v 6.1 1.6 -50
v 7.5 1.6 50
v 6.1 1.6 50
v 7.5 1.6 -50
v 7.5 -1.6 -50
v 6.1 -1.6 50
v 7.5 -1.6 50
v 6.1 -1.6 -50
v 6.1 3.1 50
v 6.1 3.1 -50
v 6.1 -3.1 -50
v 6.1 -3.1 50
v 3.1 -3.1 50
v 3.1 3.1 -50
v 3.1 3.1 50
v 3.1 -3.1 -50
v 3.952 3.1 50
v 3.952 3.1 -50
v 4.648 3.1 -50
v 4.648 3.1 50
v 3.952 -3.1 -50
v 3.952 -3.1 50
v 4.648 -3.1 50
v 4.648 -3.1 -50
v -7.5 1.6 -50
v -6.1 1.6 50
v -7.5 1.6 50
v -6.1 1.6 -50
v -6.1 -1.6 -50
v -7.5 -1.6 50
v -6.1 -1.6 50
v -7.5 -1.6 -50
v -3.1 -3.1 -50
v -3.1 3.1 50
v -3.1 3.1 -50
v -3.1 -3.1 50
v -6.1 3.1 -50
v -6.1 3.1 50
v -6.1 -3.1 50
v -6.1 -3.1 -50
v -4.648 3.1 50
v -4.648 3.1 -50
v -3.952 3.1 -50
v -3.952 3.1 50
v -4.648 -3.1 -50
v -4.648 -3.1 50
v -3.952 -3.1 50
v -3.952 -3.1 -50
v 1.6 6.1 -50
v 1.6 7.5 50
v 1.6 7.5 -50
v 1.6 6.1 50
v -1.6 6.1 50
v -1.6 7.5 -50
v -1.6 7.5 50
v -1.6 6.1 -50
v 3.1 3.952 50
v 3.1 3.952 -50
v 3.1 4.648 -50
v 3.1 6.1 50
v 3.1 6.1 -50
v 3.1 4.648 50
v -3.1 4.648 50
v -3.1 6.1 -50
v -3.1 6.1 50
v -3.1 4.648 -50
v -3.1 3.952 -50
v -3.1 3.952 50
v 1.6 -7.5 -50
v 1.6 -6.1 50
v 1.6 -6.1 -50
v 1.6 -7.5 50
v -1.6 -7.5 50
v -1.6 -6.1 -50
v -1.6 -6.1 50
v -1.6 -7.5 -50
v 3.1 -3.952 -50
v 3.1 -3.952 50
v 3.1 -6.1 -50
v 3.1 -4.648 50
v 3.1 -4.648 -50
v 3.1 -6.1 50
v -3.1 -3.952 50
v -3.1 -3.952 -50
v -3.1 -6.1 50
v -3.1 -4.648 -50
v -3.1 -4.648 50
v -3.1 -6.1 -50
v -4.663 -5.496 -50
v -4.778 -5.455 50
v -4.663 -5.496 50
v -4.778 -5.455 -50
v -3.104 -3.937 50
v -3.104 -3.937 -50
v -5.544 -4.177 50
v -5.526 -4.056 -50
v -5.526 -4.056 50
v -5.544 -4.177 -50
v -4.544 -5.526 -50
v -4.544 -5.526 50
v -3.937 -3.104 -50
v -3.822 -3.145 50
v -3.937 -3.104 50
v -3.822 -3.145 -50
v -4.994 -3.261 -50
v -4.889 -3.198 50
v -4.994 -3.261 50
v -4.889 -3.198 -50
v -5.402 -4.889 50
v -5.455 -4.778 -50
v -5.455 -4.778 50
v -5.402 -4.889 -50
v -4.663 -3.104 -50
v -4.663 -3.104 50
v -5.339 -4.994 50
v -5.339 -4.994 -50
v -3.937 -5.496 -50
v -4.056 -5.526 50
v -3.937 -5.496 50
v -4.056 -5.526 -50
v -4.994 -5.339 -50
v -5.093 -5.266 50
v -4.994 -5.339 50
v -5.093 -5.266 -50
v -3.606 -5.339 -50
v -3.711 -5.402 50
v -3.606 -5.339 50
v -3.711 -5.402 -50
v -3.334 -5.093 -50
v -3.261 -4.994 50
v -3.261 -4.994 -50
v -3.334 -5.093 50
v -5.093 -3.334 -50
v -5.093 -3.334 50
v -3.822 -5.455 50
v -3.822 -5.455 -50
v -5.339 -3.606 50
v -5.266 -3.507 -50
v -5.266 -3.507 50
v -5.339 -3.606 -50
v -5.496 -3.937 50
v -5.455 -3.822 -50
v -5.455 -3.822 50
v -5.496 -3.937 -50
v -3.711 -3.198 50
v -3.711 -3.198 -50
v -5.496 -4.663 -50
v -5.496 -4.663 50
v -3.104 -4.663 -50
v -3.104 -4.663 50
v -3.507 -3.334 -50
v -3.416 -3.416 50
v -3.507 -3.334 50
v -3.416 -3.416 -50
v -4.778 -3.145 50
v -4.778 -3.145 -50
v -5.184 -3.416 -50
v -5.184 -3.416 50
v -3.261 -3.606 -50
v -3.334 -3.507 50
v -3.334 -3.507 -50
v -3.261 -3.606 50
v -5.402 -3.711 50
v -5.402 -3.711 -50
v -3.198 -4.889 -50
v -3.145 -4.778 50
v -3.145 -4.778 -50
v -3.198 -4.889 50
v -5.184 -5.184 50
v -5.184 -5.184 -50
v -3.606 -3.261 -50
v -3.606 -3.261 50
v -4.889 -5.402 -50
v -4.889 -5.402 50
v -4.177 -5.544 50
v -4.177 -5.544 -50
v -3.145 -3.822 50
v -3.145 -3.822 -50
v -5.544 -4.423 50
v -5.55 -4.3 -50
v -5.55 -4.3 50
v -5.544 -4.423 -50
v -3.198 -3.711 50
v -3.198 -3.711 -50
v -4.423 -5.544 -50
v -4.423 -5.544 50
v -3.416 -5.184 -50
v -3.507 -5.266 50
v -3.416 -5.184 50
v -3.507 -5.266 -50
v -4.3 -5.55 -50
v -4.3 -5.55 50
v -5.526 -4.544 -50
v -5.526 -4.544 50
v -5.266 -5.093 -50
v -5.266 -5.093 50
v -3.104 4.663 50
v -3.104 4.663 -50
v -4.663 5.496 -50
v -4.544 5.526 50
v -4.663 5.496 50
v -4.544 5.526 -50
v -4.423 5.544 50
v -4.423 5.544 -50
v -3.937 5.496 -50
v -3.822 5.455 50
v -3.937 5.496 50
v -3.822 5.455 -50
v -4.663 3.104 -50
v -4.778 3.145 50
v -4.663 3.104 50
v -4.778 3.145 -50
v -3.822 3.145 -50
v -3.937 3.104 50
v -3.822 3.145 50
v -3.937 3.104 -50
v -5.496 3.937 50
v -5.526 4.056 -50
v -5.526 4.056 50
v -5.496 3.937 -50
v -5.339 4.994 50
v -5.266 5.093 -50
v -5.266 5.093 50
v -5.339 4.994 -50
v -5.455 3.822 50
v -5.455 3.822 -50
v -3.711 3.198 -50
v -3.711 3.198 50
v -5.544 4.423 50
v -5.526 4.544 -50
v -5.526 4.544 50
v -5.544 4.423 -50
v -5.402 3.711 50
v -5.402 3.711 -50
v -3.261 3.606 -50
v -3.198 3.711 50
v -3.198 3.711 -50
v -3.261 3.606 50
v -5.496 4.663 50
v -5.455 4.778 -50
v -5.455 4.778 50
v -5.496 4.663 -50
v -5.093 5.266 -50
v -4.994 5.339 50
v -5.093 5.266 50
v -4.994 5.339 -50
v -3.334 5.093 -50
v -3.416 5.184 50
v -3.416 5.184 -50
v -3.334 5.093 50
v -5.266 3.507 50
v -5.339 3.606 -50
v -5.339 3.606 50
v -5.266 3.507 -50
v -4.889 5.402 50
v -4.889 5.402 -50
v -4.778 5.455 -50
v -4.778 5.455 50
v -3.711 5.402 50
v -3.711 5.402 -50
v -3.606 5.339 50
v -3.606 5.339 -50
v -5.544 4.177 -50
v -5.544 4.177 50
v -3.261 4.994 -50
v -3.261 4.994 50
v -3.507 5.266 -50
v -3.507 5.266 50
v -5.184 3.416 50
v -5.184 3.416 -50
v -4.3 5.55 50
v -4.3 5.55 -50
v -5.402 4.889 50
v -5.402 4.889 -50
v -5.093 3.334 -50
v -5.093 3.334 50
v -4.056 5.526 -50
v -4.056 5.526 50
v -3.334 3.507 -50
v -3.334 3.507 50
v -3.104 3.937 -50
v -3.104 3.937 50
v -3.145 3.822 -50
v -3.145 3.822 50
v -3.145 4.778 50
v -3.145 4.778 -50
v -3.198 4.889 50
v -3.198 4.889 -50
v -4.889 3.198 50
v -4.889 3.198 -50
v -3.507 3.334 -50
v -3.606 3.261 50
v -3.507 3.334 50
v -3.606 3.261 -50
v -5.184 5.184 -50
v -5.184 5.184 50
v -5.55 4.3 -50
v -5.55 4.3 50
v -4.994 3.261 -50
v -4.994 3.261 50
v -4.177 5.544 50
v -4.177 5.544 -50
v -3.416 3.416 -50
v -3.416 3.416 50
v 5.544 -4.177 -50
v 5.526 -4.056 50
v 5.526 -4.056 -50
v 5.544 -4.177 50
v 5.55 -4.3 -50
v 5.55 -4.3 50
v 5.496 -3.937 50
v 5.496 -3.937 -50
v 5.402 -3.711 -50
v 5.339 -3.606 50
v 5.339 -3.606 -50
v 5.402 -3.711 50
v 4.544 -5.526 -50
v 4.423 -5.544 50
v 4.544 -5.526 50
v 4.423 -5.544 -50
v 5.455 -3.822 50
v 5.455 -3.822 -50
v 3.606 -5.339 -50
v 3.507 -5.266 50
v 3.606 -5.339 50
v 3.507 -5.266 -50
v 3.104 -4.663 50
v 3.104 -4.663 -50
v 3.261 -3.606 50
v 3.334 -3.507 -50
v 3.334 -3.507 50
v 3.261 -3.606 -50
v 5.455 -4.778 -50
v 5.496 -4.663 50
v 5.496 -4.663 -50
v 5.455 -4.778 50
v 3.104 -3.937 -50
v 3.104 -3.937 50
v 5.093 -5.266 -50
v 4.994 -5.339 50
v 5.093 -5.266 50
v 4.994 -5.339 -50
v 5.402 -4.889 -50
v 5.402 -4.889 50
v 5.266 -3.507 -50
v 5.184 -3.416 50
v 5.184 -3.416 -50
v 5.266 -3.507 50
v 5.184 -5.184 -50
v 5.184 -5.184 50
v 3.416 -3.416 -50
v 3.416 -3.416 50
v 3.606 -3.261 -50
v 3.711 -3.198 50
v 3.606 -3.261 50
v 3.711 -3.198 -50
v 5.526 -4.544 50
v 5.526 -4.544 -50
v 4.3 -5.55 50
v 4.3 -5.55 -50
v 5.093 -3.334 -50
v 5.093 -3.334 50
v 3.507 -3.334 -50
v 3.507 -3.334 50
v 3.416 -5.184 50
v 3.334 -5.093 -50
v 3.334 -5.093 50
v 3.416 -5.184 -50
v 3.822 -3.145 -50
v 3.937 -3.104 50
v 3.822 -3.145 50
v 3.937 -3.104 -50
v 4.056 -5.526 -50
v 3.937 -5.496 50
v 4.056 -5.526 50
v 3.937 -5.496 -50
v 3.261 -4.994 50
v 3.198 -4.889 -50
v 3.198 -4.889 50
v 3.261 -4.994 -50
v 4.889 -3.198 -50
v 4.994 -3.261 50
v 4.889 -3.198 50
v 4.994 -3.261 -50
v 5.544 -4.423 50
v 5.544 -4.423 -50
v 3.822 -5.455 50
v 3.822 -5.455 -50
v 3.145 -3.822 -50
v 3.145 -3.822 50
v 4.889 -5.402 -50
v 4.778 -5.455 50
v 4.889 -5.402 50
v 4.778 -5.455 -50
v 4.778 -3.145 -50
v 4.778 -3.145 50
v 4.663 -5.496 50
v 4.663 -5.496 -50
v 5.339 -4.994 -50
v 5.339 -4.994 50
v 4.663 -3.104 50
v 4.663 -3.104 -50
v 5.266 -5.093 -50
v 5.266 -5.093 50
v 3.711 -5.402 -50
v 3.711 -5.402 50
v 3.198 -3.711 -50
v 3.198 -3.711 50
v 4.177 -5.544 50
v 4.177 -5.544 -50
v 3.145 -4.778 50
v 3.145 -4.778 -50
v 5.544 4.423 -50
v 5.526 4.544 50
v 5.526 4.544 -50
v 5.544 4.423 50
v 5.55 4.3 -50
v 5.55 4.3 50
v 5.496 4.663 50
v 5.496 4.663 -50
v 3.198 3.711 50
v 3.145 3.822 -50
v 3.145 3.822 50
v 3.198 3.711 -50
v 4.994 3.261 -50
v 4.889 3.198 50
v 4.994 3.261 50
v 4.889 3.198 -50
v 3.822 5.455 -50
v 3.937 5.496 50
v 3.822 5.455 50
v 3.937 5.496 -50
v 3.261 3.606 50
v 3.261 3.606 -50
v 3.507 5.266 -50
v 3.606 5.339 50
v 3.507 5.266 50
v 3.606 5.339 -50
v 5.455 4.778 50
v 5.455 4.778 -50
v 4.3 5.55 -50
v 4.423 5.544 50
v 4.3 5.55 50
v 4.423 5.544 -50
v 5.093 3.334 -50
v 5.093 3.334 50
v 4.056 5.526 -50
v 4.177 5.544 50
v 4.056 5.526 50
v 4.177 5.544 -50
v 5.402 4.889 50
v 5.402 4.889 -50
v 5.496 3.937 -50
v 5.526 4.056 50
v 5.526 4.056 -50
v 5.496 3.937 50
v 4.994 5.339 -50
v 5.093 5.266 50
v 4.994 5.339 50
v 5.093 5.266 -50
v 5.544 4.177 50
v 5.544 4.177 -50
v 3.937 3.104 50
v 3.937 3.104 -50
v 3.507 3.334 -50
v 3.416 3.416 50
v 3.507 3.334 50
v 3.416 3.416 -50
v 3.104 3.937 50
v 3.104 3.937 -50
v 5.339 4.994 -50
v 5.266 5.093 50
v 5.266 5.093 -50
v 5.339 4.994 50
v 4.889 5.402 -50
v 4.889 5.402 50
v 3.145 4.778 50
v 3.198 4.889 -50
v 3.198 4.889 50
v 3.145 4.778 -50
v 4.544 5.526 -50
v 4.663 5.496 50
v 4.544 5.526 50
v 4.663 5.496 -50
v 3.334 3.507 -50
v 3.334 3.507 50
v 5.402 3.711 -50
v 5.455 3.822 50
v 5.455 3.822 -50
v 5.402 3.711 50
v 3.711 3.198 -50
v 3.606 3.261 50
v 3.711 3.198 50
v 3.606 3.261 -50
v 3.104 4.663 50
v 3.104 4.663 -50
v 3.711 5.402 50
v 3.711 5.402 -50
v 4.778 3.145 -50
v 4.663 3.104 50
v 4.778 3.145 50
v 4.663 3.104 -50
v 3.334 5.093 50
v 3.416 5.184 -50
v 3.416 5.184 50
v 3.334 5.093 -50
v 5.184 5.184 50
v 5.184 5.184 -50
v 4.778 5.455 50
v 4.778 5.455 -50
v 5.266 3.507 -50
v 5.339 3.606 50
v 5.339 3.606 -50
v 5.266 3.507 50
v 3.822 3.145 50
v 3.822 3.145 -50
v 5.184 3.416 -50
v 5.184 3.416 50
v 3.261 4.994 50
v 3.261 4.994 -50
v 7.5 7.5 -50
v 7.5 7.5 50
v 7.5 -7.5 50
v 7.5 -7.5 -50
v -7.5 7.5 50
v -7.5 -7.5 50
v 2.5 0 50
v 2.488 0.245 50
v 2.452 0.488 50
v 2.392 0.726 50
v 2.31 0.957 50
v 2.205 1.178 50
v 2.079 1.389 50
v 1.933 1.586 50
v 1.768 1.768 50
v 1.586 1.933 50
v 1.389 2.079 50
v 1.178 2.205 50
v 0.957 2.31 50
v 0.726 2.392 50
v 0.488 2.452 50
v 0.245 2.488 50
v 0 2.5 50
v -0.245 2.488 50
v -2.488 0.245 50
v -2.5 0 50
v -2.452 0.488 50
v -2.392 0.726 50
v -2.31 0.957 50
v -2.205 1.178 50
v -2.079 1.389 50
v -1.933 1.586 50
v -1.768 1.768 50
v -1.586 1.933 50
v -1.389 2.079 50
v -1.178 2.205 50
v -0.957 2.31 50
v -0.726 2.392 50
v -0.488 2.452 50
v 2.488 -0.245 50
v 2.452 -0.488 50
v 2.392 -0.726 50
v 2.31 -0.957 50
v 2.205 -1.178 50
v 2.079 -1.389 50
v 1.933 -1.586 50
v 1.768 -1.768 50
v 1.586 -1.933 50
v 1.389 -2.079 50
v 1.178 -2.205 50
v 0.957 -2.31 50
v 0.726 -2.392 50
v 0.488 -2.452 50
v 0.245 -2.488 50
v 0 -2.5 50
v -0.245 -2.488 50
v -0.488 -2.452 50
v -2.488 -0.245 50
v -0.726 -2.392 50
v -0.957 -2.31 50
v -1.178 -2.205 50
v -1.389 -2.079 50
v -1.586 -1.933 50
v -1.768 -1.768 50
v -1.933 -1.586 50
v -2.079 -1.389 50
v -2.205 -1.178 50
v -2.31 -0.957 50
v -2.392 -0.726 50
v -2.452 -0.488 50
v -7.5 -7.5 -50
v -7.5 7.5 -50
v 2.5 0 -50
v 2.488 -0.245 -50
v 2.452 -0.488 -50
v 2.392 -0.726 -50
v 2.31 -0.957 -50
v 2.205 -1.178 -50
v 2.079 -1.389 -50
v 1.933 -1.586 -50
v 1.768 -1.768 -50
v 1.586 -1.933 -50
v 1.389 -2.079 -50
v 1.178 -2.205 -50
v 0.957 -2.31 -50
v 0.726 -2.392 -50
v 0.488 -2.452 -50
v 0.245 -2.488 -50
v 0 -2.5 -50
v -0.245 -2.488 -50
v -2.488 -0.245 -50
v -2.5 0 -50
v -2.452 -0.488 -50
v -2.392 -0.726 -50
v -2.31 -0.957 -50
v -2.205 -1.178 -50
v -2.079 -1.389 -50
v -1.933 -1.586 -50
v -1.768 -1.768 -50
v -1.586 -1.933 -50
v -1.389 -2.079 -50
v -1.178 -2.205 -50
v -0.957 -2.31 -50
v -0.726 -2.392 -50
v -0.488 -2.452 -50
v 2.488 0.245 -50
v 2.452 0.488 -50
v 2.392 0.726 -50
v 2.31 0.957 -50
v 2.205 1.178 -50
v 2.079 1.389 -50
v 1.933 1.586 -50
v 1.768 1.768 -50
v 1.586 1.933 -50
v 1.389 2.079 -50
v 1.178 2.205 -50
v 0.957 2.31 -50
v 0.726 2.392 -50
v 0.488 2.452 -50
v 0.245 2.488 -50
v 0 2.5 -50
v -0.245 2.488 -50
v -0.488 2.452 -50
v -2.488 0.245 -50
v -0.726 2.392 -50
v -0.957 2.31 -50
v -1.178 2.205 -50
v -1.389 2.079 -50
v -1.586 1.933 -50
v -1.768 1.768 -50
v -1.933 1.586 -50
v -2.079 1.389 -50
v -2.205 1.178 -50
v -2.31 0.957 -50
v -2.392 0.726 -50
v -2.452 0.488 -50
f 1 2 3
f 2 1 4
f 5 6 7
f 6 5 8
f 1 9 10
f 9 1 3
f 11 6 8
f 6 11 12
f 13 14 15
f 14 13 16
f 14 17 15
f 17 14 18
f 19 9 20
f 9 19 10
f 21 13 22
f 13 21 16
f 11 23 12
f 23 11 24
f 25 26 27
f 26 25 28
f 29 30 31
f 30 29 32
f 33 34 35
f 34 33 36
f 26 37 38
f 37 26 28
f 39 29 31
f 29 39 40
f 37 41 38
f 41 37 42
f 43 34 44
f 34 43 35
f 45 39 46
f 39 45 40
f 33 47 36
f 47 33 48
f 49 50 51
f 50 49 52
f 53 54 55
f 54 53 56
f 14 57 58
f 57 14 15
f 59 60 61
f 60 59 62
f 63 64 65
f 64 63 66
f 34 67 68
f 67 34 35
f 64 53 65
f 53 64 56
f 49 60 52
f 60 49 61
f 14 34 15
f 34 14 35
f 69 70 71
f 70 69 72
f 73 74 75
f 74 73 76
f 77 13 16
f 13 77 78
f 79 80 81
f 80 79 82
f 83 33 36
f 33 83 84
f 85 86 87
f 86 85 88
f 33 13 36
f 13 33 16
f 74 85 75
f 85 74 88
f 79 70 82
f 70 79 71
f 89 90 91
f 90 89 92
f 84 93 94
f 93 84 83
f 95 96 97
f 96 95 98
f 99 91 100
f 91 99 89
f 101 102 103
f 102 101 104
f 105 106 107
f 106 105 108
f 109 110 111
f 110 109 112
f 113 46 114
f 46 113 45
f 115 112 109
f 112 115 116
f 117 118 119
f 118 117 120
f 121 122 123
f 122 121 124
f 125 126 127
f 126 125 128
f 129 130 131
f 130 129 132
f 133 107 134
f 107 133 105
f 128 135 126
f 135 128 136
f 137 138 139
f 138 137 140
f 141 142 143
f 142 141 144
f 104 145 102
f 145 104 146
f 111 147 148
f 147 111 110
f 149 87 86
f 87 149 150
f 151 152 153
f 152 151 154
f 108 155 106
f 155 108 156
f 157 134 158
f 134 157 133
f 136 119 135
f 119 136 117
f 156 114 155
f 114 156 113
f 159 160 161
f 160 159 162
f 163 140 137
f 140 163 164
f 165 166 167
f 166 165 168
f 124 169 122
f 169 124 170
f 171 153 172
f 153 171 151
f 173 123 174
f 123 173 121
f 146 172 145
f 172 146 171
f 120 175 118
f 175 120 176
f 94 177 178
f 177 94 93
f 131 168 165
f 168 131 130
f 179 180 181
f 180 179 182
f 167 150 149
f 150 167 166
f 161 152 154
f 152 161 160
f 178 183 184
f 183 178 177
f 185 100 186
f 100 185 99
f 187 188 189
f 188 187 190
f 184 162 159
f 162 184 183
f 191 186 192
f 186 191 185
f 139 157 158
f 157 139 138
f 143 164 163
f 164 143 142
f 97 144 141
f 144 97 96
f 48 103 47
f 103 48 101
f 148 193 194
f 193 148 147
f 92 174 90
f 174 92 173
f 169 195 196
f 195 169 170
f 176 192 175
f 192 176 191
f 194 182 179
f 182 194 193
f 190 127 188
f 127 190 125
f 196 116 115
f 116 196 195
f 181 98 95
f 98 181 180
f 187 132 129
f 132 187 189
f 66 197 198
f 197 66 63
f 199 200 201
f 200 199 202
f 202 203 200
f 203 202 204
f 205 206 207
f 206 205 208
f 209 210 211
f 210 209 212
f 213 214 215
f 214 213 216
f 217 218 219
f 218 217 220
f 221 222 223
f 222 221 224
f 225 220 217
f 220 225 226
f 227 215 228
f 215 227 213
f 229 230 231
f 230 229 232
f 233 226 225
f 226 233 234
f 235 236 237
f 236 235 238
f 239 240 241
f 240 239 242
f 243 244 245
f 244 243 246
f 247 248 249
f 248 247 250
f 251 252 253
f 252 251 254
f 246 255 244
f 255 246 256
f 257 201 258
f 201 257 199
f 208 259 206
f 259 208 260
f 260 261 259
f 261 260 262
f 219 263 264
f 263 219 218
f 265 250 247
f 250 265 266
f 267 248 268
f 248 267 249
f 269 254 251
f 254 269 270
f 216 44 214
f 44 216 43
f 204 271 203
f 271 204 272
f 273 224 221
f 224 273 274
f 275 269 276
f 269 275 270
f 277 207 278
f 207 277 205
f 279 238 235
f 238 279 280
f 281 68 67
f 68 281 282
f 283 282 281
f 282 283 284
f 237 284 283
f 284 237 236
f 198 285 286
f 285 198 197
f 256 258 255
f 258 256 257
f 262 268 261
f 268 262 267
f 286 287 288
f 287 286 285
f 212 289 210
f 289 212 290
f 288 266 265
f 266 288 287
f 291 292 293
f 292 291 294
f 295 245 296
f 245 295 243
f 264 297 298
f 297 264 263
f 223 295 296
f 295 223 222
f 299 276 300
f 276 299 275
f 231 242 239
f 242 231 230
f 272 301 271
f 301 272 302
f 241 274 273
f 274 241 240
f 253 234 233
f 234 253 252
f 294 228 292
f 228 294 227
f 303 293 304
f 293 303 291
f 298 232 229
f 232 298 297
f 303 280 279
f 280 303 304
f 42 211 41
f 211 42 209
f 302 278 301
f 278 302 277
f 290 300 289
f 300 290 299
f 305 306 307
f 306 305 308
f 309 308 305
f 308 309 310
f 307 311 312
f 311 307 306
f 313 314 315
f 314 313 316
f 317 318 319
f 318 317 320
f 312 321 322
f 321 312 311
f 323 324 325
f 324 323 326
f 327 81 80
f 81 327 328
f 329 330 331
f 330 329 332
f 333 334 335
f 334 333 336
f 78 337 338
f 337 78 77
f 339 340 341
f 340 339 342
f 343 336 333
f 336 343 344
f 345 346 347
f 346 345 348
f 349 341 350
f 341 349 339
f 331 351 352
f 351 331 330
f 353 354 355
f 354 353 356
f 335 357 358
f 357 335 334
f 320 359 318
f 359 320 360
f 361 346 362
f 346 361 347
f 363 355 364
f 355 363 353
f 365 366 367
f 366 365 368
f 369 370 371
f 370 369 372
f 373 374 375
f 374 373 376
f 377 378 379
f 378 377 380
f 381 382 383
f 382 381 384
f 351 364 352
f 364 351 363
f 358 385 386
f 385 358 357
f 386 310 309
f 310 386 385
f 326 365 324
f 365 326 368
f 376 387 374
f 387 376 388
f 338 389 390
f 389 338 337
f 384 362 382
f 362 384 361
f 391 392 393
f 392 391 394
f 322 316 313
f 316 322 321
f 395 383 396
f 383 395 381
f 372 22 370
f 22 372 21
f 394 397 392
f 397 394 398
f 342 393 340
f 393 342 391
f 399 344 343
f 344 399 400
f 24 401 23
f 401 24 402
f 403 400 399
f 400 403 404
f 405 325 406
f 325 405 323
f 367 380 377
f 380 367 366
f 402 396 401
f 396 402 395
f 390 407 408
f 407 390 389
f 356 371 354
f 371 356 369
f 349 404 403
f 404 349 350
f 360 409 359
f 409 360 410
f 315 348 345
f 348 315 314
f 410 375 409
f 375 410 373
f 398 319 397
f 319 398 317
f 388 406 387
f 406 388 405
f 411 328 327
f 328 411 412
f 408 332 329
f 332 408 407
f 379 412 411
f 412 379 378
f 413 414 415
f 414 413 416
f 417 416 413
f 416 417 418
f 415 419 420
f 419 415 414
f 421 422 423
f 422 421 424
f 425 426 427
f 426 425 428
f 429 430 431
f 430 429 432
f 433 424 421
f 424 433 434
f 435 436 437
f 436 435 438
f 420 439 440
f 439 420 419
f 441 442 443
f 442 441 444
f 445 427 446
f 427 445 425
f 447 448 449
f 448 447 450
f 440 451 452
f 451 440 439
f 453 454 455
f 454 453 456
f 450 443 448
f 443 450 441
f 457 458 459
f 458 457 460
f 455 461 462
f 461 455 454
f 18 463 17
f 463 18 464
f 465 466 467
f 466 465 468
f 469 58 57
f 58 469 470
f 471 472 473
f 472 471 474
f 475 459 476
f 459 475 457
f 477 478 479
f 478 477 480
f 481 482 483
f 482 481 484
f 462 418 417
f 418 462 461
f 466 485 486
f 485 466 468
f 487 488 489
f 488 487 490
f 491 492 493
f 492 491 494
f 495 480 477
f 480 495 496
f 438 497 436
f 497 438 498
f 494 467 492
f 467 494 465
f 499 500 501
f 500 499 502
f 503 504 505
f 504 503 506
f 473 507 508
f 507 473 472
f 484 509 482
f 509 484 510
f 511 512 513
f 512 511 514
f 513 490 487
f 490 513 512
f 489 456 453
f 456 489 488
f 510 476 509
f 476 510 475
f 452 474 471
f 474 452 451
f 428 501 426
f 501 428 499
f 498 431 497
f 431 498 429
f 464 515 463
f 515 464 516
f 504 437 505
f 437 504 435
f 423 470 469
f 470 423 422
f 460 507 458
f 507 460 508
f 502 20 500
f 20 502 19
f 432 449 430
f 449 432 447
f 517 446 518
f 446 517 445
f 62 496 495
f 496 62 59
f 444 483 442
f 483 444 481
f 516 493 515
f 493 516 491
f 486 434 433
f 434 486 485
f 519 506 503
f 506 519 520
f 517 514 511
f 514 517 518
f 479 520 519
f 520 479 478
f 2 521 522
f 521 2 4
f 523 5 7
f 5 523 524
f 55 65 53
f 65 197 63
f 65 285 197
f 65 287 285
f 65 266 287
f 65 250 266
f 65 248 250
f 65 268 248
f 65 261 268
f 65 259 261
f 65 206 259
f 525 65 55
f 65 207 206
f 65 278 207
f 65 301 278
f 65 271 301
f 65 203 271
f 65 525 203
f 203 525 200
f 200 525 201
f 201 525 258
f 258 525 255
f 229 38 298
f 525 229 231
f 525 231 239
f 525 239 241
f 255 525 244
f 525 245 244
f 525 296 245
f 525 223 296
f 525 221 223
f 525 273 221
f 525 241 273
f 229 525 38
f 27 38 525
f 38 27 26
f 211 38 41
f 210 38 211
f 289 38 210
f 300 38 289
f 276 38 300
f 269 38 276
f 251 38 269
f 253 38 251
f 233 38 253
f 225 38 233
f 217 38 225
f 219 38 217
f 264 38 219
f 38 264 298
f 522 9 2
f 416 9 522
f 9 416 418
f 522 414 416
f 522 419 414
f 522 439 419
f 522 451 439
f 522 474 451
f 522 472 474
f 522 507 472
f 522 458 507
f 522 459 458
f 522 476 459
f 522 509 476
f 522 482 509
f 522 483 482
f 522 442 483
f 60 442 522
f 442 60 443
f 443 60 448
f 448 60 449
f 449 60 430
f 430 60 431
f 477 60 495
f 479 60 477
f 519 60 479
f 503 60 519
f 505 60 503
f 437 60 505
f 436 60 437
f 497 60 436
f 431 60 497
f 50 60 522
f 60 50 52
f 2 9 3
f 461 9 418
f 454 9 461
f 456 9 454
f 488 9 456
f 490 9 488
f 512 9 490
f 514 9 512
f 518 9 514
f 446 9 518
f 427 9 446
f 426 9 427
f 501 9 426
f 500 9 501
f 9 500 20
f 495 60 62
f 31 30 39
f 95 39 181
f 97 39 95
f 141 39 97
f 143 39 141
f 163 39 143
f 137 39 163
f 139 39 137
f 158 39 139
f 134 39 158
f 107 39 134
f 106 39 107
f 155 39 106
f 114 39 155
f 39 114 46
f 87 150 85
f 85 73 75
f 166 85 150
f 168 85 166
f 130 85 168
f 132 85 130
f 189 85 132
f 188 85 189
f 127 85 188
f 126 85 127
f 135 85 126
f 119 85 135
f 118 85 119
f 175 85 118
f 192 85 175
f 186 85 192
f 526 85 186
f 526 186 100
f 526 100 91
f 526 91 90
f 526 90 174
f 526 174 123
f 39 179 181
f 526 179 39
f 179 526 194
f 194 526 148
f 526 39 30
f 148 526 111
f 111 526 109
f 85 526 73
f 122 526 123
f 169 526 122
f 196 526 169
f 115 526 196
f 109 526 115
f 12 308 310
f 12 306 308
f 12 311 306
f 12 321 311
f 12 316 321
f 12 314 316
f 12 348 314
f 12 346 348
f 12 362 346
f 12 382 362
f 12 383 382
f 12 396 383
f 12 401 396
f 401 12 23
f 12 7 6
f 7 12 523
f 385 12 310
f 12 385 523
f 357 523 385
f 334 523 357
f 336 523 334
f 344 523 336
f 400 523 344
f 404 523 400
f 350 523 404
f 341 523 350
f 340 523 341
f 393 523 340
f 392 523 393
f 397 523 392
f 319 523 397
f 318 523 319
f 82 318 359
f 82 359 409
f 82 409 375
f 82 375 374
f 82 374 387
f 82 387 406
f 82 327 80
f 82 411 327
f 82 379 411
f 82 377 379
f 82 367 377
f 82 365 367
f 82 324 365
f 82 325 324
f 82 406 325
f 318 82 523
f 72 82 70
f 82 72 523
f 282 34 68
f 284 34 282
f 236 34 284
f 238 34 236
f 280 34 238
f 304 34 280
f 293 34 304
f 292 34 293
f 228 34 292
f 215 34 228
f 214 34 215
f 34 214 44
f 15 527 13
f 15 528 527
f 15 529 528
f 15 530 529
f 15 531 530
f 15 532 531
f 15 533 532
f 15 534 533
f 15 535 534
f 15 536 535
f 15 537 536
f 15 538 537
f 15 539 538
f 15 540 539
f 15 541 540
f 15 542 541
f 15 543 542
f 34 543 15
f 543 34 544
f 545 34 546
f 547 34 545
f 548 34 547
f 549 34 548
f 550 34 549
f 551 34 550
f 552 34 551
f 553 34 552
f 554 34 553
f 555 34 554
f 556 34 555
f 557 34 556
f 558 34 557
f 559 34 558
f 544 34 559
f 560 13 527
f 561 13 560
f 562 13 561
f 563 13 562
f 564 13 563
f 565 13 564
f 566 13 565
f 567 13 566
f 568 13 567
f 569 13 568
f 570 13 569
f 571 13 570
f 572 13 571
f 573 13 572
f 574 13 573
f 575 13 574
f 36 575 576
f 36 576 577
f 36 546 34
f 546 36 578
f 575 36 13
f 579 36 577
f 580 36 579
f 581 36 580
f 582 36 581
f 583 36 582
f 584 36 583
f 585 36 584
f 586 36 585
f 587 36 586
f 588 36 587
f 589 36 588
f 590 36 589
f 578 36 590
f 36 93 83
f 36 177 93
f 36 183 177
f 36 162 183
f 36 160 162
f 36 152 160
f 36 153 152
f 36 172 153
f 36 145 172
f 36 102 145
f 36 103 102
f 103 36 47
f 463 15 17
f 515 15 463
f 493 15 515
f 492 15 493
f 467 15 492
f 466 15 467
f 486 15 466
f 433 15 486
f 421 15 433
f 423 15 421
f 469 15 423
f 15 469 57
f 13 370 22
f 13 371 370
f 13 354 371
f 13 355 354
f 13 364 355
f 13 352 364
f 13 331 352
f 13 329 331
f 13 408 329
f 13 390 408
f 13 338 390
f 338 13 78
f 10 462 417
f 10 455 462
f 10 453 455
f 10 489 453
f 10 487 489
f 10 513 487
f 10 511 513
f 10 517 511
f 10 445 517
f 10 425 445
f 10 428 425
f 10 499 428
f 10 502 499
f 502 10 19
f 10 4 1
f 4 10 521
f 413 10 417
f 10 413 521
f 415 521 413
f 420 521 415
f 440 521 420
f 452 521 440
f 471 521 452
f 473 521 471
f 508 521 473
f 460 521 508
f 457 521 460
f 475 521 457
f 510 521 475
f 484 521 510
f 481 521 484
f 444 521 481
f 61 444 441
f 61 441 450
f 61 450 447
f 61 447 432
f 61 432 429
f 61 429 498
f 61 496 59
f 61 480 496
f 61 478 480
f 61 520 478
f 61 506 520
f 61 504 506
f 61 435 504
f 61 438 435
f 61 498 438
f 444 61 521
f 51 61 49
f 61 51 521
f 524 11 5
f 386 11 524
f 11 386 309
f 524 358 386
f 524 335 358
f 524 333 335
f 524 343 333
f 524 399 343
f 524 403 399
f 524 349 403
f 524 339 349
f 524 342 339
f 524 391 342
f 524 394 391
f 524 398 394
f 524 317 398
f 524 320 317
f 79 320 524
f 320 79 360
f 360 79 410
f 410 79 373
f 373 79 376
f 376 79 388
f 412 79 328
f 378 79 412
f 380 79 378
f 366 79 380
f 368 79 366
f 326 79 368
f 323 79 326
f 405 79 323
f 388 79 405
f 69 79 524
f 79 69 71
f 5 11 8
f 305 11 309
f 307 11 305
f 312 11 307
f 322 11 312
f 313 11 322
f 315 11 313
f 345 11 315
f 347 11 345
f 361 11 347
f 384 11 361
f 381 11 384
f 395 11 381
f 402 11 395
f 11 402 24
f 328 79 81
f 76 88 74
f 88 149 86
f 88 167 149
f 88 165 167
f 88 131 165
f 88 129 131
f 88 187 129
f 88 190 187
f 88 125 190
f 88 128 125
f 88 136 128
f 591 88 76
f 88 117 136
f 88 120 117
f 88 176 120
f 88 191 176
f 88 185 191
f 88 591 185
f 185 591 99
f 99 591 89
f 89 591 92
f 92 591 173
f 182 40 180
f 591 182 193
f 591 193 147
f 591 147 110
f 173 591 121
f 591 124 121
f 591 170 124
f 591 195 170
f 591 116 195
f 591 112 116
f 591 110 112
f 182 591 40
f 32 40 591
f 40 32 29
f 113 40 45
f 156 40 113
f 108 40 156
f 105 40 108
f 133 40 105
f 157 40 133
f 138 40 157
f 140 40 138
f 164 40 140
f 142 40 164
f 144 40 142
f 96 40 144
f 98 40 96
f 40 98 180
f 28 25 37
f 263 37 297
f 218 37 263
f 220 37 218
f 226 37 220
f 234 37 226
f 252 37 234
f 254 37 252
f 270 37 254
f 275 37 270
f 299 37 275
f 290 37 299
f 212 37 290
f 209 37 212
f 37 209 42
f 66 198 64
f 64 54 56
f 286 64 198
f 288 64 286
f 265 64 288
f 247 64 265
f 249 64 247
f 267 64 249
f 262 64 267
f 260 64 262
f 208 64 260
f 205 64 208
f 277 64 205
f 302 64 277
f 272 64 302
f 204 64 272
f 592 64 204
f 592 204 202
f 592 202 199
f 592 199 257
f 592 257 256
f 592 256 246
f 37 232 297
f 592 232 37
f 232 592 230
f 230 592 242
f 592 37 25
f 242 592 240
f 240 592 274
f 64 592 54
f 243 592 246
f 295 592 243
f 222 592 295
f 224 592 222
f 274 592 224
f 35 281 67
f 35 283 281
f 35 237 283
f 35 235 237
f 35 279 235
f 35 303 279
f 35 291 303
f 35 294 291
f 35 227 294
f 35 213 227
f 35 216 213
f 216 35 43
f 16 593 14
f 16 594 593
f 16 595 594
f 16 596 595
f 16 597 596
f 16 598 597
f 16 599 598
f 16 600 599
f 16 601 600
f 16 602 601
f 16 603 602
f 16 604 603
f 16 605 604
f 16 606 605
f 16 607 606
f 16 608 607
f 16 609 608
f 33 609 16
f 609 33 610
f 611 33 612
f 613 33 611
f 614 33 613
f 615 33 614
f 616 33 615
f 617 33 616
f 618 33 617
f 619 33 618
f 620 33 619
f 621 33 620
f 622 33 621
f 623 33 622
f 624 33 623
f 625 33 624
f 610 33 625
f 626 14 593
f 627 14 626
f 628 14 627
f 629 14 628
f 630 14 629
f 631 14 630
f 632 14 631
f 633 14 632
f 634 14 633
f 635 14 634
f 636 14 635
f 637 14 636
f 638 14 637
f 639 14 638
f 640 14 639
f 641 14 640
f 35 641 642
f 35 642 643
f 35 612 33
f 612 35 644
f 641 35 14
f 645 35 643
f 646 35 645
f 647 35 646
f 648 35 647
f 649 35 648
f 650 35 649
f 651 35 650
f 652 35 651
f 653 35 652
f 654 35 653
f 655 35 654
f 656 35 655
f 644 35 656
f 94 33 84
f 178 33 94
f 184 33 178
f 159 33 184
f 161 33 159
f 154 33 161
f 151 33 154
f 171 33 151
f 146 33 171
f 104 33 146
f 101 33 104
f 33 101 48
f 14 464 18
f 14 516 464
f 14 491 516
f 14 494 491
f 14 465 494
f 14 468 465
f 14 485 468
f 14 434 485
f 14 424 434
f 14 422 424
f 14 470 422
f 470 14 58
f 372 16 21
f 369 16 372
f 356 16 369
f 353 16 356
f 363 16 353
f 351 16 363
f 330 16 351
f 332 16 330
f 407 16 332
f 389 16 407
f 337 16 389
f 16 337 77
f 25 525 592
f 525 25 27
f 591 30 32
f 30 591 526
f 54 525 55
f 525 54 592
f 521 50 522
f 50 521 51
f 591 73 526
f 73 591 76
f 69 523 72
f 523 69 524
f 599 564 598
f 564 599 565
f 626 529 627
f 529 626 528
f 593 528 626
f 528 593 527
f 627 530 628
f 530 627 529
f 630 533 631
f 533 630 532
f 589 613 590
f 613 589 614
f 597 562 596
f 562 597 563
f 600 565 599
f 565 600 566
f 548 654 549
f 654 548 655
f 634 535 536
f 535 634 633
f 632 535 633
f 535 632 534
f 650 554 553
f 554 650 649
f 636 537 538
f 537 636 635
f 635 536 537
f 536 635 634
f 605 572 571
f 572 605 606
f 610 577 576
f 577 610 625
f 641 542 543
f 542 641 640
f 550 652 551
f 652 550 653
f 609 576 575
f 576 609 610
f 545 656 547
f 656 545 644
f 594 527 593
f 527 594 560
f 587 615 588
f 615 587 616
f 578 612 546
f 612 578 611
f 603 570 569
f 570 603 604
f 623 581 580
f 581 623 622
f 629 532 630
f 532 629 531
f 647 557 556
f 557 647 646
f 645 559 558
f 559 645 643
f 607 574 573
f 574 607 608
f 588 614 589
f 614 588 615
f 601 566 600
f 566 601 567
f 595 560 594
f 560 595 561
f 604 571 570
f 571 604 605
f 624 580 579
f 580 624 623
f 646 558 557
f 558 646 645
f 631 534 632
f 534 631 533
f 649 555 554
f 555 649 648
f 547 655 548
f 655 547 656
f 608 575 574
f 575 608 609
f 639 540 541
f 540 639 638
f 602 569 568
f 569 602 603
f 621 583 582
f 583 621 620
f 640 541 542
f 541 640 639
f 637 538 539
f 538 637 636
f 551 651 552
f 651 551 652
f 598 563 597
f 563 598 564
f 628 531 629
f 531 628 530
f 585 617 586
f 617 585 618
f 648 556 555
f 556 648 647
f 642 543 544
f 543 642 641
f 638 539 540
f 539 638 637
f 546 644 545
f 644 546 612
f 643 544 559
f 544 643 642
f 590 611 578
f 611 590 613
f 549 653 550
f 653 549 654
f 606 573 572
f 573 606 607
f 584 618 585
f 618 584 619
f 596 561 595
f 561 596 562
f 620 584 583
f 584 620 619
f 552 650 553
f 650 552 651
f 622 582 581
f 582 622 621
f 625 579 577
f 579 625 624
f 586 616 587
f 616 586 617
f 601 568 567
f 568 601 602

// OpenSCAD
// 15x15 aluminium extrusion profile, 100mm long (single connected solid)

$fn = 64;

// Parameters (mm)
cross_section_width_mm  = 15.0;
cross_section_height_mm = 15.0;
length_mm               = 100.0;

// Feature sizes (mm) - tuned for a small 15-series style profile
overlap_mm              = 0.2;   // small overlap for robust boolean ops
slot_opening_width_mm   = 3.2;   // mouth opening at the outer face
slot_inner_width_mm     = 6.2;   // wider cavity behind the mouth
slot_depth_mm           = 4.2;   // total depth from outer face to cavity end
slot_neck_depth_mm      = 1.6;   // depth of the narrow mouth section
center_bore_diameter_mm = 5.0;   // through bore
corner_relief_diameter_mm = 2.5; // small corner relief holes
corner_relief_offset_mm   = 3.2; // from outer corner along each axis

// Safety clamps to avoid invalid geometry
slot_neck_depth = min(slot_neck_depth_mm, slot_depth_mm - 0.1);
slot_depth      = min(slot_depth_mm, min(cross_section_width_mm, cross_section_height_mm)/2 - 0.5);
slot_open_w     = min(slot_opening_width_mm, min(cross_section_width_mm, cross_section_height_mm) - 2.0);
slot_inner_w    = min(slot_inner_width_mm,   min(cross_section_width_mm, cross_section_height_mm) - 1.0);

module tslot_cut_x(sign=1, h=10) {
    // Cuts a T-slot from the +X or -X face inward
    // sign = +1 for +X face, -1 for -X face
    union() {
        // Narrow mouth (neck) - reaches the outer face
        translate([sign*(cross_section_width_mm/2 - slot_neck_depth/2), 0, 0])
            cube([slot_neck_depth + 2*overlap_mm, slot_open_w, h], center=true);

        // Wider cavity behind the mouth
        translate([sign*(cross_section_width_mm/2 - slot_neck_depth - (slot_depth - slot_neck_depth)/2), 0, 0])
            cube([ (slot_depth - slot_neck_depth) + 2*overlap_mm, slot_inner_w, h], center=true);
    }
}

module tslot_cut_y(sign=1, h=10) {
    // Cuts a T-slot from the +Y or -Y face inward
    union() {
        translate([0, sign*(cross_section_height_mm/2 - slot_neck_depth/2), 0])
            cube([slot_open_w, slot_neck_depth + 2*overlap_mm, h], center=true);

        translate([0, sign*(cross_section_height_mm/2 - slot_neck_depth - (slot_depth - slot_neck_depth)/2), 0])
            cube([slot_inner_w, (slot_depth - slot_neck_depth) + 2*overlap_mm, h], center=true);
    }
}

module extrusion_15x15(len=100) {
    color("Silver")
    difference() {
        // Main body
        cube([cross_section_width_mm, cross_section_height_mm, len], center=true);

        // Center bore (through)
        cylinder(d=center_bore_diameter_mm, h=len + 2*overlap_mm, center=true);

        // Four T-slots (through along length)
        union() {
            tslot_cut_x(+1, len + 2*overlap_mm);
            tslot_cut_x(-1, len + 2*overlap_mm);
            tslot_cut_y(+1, len + 2*overlap_mm);
            tslot_cut_y(-1, len + 2*overlap_mm);
        }

        // Corner relief holes (through)
        if (corner_relief_diameter_mm > 0) {
            for (sx = [-1, 1], sy = [-1, 1]) {
                translate([
                    sx*(cross_section_width_mm/2  - corner_relief_offset_mm),
                    sy*(cross_section_height_mm/2 - corner_relief_offset_mm),
                    0
                ])
                cylinder(d=corner_relief_diameter_mm, h=len + 2*overlap_mm, center=true);
            }
        }
    }
}

// Single connected solid only
extrusion_15x15(length_mm);
